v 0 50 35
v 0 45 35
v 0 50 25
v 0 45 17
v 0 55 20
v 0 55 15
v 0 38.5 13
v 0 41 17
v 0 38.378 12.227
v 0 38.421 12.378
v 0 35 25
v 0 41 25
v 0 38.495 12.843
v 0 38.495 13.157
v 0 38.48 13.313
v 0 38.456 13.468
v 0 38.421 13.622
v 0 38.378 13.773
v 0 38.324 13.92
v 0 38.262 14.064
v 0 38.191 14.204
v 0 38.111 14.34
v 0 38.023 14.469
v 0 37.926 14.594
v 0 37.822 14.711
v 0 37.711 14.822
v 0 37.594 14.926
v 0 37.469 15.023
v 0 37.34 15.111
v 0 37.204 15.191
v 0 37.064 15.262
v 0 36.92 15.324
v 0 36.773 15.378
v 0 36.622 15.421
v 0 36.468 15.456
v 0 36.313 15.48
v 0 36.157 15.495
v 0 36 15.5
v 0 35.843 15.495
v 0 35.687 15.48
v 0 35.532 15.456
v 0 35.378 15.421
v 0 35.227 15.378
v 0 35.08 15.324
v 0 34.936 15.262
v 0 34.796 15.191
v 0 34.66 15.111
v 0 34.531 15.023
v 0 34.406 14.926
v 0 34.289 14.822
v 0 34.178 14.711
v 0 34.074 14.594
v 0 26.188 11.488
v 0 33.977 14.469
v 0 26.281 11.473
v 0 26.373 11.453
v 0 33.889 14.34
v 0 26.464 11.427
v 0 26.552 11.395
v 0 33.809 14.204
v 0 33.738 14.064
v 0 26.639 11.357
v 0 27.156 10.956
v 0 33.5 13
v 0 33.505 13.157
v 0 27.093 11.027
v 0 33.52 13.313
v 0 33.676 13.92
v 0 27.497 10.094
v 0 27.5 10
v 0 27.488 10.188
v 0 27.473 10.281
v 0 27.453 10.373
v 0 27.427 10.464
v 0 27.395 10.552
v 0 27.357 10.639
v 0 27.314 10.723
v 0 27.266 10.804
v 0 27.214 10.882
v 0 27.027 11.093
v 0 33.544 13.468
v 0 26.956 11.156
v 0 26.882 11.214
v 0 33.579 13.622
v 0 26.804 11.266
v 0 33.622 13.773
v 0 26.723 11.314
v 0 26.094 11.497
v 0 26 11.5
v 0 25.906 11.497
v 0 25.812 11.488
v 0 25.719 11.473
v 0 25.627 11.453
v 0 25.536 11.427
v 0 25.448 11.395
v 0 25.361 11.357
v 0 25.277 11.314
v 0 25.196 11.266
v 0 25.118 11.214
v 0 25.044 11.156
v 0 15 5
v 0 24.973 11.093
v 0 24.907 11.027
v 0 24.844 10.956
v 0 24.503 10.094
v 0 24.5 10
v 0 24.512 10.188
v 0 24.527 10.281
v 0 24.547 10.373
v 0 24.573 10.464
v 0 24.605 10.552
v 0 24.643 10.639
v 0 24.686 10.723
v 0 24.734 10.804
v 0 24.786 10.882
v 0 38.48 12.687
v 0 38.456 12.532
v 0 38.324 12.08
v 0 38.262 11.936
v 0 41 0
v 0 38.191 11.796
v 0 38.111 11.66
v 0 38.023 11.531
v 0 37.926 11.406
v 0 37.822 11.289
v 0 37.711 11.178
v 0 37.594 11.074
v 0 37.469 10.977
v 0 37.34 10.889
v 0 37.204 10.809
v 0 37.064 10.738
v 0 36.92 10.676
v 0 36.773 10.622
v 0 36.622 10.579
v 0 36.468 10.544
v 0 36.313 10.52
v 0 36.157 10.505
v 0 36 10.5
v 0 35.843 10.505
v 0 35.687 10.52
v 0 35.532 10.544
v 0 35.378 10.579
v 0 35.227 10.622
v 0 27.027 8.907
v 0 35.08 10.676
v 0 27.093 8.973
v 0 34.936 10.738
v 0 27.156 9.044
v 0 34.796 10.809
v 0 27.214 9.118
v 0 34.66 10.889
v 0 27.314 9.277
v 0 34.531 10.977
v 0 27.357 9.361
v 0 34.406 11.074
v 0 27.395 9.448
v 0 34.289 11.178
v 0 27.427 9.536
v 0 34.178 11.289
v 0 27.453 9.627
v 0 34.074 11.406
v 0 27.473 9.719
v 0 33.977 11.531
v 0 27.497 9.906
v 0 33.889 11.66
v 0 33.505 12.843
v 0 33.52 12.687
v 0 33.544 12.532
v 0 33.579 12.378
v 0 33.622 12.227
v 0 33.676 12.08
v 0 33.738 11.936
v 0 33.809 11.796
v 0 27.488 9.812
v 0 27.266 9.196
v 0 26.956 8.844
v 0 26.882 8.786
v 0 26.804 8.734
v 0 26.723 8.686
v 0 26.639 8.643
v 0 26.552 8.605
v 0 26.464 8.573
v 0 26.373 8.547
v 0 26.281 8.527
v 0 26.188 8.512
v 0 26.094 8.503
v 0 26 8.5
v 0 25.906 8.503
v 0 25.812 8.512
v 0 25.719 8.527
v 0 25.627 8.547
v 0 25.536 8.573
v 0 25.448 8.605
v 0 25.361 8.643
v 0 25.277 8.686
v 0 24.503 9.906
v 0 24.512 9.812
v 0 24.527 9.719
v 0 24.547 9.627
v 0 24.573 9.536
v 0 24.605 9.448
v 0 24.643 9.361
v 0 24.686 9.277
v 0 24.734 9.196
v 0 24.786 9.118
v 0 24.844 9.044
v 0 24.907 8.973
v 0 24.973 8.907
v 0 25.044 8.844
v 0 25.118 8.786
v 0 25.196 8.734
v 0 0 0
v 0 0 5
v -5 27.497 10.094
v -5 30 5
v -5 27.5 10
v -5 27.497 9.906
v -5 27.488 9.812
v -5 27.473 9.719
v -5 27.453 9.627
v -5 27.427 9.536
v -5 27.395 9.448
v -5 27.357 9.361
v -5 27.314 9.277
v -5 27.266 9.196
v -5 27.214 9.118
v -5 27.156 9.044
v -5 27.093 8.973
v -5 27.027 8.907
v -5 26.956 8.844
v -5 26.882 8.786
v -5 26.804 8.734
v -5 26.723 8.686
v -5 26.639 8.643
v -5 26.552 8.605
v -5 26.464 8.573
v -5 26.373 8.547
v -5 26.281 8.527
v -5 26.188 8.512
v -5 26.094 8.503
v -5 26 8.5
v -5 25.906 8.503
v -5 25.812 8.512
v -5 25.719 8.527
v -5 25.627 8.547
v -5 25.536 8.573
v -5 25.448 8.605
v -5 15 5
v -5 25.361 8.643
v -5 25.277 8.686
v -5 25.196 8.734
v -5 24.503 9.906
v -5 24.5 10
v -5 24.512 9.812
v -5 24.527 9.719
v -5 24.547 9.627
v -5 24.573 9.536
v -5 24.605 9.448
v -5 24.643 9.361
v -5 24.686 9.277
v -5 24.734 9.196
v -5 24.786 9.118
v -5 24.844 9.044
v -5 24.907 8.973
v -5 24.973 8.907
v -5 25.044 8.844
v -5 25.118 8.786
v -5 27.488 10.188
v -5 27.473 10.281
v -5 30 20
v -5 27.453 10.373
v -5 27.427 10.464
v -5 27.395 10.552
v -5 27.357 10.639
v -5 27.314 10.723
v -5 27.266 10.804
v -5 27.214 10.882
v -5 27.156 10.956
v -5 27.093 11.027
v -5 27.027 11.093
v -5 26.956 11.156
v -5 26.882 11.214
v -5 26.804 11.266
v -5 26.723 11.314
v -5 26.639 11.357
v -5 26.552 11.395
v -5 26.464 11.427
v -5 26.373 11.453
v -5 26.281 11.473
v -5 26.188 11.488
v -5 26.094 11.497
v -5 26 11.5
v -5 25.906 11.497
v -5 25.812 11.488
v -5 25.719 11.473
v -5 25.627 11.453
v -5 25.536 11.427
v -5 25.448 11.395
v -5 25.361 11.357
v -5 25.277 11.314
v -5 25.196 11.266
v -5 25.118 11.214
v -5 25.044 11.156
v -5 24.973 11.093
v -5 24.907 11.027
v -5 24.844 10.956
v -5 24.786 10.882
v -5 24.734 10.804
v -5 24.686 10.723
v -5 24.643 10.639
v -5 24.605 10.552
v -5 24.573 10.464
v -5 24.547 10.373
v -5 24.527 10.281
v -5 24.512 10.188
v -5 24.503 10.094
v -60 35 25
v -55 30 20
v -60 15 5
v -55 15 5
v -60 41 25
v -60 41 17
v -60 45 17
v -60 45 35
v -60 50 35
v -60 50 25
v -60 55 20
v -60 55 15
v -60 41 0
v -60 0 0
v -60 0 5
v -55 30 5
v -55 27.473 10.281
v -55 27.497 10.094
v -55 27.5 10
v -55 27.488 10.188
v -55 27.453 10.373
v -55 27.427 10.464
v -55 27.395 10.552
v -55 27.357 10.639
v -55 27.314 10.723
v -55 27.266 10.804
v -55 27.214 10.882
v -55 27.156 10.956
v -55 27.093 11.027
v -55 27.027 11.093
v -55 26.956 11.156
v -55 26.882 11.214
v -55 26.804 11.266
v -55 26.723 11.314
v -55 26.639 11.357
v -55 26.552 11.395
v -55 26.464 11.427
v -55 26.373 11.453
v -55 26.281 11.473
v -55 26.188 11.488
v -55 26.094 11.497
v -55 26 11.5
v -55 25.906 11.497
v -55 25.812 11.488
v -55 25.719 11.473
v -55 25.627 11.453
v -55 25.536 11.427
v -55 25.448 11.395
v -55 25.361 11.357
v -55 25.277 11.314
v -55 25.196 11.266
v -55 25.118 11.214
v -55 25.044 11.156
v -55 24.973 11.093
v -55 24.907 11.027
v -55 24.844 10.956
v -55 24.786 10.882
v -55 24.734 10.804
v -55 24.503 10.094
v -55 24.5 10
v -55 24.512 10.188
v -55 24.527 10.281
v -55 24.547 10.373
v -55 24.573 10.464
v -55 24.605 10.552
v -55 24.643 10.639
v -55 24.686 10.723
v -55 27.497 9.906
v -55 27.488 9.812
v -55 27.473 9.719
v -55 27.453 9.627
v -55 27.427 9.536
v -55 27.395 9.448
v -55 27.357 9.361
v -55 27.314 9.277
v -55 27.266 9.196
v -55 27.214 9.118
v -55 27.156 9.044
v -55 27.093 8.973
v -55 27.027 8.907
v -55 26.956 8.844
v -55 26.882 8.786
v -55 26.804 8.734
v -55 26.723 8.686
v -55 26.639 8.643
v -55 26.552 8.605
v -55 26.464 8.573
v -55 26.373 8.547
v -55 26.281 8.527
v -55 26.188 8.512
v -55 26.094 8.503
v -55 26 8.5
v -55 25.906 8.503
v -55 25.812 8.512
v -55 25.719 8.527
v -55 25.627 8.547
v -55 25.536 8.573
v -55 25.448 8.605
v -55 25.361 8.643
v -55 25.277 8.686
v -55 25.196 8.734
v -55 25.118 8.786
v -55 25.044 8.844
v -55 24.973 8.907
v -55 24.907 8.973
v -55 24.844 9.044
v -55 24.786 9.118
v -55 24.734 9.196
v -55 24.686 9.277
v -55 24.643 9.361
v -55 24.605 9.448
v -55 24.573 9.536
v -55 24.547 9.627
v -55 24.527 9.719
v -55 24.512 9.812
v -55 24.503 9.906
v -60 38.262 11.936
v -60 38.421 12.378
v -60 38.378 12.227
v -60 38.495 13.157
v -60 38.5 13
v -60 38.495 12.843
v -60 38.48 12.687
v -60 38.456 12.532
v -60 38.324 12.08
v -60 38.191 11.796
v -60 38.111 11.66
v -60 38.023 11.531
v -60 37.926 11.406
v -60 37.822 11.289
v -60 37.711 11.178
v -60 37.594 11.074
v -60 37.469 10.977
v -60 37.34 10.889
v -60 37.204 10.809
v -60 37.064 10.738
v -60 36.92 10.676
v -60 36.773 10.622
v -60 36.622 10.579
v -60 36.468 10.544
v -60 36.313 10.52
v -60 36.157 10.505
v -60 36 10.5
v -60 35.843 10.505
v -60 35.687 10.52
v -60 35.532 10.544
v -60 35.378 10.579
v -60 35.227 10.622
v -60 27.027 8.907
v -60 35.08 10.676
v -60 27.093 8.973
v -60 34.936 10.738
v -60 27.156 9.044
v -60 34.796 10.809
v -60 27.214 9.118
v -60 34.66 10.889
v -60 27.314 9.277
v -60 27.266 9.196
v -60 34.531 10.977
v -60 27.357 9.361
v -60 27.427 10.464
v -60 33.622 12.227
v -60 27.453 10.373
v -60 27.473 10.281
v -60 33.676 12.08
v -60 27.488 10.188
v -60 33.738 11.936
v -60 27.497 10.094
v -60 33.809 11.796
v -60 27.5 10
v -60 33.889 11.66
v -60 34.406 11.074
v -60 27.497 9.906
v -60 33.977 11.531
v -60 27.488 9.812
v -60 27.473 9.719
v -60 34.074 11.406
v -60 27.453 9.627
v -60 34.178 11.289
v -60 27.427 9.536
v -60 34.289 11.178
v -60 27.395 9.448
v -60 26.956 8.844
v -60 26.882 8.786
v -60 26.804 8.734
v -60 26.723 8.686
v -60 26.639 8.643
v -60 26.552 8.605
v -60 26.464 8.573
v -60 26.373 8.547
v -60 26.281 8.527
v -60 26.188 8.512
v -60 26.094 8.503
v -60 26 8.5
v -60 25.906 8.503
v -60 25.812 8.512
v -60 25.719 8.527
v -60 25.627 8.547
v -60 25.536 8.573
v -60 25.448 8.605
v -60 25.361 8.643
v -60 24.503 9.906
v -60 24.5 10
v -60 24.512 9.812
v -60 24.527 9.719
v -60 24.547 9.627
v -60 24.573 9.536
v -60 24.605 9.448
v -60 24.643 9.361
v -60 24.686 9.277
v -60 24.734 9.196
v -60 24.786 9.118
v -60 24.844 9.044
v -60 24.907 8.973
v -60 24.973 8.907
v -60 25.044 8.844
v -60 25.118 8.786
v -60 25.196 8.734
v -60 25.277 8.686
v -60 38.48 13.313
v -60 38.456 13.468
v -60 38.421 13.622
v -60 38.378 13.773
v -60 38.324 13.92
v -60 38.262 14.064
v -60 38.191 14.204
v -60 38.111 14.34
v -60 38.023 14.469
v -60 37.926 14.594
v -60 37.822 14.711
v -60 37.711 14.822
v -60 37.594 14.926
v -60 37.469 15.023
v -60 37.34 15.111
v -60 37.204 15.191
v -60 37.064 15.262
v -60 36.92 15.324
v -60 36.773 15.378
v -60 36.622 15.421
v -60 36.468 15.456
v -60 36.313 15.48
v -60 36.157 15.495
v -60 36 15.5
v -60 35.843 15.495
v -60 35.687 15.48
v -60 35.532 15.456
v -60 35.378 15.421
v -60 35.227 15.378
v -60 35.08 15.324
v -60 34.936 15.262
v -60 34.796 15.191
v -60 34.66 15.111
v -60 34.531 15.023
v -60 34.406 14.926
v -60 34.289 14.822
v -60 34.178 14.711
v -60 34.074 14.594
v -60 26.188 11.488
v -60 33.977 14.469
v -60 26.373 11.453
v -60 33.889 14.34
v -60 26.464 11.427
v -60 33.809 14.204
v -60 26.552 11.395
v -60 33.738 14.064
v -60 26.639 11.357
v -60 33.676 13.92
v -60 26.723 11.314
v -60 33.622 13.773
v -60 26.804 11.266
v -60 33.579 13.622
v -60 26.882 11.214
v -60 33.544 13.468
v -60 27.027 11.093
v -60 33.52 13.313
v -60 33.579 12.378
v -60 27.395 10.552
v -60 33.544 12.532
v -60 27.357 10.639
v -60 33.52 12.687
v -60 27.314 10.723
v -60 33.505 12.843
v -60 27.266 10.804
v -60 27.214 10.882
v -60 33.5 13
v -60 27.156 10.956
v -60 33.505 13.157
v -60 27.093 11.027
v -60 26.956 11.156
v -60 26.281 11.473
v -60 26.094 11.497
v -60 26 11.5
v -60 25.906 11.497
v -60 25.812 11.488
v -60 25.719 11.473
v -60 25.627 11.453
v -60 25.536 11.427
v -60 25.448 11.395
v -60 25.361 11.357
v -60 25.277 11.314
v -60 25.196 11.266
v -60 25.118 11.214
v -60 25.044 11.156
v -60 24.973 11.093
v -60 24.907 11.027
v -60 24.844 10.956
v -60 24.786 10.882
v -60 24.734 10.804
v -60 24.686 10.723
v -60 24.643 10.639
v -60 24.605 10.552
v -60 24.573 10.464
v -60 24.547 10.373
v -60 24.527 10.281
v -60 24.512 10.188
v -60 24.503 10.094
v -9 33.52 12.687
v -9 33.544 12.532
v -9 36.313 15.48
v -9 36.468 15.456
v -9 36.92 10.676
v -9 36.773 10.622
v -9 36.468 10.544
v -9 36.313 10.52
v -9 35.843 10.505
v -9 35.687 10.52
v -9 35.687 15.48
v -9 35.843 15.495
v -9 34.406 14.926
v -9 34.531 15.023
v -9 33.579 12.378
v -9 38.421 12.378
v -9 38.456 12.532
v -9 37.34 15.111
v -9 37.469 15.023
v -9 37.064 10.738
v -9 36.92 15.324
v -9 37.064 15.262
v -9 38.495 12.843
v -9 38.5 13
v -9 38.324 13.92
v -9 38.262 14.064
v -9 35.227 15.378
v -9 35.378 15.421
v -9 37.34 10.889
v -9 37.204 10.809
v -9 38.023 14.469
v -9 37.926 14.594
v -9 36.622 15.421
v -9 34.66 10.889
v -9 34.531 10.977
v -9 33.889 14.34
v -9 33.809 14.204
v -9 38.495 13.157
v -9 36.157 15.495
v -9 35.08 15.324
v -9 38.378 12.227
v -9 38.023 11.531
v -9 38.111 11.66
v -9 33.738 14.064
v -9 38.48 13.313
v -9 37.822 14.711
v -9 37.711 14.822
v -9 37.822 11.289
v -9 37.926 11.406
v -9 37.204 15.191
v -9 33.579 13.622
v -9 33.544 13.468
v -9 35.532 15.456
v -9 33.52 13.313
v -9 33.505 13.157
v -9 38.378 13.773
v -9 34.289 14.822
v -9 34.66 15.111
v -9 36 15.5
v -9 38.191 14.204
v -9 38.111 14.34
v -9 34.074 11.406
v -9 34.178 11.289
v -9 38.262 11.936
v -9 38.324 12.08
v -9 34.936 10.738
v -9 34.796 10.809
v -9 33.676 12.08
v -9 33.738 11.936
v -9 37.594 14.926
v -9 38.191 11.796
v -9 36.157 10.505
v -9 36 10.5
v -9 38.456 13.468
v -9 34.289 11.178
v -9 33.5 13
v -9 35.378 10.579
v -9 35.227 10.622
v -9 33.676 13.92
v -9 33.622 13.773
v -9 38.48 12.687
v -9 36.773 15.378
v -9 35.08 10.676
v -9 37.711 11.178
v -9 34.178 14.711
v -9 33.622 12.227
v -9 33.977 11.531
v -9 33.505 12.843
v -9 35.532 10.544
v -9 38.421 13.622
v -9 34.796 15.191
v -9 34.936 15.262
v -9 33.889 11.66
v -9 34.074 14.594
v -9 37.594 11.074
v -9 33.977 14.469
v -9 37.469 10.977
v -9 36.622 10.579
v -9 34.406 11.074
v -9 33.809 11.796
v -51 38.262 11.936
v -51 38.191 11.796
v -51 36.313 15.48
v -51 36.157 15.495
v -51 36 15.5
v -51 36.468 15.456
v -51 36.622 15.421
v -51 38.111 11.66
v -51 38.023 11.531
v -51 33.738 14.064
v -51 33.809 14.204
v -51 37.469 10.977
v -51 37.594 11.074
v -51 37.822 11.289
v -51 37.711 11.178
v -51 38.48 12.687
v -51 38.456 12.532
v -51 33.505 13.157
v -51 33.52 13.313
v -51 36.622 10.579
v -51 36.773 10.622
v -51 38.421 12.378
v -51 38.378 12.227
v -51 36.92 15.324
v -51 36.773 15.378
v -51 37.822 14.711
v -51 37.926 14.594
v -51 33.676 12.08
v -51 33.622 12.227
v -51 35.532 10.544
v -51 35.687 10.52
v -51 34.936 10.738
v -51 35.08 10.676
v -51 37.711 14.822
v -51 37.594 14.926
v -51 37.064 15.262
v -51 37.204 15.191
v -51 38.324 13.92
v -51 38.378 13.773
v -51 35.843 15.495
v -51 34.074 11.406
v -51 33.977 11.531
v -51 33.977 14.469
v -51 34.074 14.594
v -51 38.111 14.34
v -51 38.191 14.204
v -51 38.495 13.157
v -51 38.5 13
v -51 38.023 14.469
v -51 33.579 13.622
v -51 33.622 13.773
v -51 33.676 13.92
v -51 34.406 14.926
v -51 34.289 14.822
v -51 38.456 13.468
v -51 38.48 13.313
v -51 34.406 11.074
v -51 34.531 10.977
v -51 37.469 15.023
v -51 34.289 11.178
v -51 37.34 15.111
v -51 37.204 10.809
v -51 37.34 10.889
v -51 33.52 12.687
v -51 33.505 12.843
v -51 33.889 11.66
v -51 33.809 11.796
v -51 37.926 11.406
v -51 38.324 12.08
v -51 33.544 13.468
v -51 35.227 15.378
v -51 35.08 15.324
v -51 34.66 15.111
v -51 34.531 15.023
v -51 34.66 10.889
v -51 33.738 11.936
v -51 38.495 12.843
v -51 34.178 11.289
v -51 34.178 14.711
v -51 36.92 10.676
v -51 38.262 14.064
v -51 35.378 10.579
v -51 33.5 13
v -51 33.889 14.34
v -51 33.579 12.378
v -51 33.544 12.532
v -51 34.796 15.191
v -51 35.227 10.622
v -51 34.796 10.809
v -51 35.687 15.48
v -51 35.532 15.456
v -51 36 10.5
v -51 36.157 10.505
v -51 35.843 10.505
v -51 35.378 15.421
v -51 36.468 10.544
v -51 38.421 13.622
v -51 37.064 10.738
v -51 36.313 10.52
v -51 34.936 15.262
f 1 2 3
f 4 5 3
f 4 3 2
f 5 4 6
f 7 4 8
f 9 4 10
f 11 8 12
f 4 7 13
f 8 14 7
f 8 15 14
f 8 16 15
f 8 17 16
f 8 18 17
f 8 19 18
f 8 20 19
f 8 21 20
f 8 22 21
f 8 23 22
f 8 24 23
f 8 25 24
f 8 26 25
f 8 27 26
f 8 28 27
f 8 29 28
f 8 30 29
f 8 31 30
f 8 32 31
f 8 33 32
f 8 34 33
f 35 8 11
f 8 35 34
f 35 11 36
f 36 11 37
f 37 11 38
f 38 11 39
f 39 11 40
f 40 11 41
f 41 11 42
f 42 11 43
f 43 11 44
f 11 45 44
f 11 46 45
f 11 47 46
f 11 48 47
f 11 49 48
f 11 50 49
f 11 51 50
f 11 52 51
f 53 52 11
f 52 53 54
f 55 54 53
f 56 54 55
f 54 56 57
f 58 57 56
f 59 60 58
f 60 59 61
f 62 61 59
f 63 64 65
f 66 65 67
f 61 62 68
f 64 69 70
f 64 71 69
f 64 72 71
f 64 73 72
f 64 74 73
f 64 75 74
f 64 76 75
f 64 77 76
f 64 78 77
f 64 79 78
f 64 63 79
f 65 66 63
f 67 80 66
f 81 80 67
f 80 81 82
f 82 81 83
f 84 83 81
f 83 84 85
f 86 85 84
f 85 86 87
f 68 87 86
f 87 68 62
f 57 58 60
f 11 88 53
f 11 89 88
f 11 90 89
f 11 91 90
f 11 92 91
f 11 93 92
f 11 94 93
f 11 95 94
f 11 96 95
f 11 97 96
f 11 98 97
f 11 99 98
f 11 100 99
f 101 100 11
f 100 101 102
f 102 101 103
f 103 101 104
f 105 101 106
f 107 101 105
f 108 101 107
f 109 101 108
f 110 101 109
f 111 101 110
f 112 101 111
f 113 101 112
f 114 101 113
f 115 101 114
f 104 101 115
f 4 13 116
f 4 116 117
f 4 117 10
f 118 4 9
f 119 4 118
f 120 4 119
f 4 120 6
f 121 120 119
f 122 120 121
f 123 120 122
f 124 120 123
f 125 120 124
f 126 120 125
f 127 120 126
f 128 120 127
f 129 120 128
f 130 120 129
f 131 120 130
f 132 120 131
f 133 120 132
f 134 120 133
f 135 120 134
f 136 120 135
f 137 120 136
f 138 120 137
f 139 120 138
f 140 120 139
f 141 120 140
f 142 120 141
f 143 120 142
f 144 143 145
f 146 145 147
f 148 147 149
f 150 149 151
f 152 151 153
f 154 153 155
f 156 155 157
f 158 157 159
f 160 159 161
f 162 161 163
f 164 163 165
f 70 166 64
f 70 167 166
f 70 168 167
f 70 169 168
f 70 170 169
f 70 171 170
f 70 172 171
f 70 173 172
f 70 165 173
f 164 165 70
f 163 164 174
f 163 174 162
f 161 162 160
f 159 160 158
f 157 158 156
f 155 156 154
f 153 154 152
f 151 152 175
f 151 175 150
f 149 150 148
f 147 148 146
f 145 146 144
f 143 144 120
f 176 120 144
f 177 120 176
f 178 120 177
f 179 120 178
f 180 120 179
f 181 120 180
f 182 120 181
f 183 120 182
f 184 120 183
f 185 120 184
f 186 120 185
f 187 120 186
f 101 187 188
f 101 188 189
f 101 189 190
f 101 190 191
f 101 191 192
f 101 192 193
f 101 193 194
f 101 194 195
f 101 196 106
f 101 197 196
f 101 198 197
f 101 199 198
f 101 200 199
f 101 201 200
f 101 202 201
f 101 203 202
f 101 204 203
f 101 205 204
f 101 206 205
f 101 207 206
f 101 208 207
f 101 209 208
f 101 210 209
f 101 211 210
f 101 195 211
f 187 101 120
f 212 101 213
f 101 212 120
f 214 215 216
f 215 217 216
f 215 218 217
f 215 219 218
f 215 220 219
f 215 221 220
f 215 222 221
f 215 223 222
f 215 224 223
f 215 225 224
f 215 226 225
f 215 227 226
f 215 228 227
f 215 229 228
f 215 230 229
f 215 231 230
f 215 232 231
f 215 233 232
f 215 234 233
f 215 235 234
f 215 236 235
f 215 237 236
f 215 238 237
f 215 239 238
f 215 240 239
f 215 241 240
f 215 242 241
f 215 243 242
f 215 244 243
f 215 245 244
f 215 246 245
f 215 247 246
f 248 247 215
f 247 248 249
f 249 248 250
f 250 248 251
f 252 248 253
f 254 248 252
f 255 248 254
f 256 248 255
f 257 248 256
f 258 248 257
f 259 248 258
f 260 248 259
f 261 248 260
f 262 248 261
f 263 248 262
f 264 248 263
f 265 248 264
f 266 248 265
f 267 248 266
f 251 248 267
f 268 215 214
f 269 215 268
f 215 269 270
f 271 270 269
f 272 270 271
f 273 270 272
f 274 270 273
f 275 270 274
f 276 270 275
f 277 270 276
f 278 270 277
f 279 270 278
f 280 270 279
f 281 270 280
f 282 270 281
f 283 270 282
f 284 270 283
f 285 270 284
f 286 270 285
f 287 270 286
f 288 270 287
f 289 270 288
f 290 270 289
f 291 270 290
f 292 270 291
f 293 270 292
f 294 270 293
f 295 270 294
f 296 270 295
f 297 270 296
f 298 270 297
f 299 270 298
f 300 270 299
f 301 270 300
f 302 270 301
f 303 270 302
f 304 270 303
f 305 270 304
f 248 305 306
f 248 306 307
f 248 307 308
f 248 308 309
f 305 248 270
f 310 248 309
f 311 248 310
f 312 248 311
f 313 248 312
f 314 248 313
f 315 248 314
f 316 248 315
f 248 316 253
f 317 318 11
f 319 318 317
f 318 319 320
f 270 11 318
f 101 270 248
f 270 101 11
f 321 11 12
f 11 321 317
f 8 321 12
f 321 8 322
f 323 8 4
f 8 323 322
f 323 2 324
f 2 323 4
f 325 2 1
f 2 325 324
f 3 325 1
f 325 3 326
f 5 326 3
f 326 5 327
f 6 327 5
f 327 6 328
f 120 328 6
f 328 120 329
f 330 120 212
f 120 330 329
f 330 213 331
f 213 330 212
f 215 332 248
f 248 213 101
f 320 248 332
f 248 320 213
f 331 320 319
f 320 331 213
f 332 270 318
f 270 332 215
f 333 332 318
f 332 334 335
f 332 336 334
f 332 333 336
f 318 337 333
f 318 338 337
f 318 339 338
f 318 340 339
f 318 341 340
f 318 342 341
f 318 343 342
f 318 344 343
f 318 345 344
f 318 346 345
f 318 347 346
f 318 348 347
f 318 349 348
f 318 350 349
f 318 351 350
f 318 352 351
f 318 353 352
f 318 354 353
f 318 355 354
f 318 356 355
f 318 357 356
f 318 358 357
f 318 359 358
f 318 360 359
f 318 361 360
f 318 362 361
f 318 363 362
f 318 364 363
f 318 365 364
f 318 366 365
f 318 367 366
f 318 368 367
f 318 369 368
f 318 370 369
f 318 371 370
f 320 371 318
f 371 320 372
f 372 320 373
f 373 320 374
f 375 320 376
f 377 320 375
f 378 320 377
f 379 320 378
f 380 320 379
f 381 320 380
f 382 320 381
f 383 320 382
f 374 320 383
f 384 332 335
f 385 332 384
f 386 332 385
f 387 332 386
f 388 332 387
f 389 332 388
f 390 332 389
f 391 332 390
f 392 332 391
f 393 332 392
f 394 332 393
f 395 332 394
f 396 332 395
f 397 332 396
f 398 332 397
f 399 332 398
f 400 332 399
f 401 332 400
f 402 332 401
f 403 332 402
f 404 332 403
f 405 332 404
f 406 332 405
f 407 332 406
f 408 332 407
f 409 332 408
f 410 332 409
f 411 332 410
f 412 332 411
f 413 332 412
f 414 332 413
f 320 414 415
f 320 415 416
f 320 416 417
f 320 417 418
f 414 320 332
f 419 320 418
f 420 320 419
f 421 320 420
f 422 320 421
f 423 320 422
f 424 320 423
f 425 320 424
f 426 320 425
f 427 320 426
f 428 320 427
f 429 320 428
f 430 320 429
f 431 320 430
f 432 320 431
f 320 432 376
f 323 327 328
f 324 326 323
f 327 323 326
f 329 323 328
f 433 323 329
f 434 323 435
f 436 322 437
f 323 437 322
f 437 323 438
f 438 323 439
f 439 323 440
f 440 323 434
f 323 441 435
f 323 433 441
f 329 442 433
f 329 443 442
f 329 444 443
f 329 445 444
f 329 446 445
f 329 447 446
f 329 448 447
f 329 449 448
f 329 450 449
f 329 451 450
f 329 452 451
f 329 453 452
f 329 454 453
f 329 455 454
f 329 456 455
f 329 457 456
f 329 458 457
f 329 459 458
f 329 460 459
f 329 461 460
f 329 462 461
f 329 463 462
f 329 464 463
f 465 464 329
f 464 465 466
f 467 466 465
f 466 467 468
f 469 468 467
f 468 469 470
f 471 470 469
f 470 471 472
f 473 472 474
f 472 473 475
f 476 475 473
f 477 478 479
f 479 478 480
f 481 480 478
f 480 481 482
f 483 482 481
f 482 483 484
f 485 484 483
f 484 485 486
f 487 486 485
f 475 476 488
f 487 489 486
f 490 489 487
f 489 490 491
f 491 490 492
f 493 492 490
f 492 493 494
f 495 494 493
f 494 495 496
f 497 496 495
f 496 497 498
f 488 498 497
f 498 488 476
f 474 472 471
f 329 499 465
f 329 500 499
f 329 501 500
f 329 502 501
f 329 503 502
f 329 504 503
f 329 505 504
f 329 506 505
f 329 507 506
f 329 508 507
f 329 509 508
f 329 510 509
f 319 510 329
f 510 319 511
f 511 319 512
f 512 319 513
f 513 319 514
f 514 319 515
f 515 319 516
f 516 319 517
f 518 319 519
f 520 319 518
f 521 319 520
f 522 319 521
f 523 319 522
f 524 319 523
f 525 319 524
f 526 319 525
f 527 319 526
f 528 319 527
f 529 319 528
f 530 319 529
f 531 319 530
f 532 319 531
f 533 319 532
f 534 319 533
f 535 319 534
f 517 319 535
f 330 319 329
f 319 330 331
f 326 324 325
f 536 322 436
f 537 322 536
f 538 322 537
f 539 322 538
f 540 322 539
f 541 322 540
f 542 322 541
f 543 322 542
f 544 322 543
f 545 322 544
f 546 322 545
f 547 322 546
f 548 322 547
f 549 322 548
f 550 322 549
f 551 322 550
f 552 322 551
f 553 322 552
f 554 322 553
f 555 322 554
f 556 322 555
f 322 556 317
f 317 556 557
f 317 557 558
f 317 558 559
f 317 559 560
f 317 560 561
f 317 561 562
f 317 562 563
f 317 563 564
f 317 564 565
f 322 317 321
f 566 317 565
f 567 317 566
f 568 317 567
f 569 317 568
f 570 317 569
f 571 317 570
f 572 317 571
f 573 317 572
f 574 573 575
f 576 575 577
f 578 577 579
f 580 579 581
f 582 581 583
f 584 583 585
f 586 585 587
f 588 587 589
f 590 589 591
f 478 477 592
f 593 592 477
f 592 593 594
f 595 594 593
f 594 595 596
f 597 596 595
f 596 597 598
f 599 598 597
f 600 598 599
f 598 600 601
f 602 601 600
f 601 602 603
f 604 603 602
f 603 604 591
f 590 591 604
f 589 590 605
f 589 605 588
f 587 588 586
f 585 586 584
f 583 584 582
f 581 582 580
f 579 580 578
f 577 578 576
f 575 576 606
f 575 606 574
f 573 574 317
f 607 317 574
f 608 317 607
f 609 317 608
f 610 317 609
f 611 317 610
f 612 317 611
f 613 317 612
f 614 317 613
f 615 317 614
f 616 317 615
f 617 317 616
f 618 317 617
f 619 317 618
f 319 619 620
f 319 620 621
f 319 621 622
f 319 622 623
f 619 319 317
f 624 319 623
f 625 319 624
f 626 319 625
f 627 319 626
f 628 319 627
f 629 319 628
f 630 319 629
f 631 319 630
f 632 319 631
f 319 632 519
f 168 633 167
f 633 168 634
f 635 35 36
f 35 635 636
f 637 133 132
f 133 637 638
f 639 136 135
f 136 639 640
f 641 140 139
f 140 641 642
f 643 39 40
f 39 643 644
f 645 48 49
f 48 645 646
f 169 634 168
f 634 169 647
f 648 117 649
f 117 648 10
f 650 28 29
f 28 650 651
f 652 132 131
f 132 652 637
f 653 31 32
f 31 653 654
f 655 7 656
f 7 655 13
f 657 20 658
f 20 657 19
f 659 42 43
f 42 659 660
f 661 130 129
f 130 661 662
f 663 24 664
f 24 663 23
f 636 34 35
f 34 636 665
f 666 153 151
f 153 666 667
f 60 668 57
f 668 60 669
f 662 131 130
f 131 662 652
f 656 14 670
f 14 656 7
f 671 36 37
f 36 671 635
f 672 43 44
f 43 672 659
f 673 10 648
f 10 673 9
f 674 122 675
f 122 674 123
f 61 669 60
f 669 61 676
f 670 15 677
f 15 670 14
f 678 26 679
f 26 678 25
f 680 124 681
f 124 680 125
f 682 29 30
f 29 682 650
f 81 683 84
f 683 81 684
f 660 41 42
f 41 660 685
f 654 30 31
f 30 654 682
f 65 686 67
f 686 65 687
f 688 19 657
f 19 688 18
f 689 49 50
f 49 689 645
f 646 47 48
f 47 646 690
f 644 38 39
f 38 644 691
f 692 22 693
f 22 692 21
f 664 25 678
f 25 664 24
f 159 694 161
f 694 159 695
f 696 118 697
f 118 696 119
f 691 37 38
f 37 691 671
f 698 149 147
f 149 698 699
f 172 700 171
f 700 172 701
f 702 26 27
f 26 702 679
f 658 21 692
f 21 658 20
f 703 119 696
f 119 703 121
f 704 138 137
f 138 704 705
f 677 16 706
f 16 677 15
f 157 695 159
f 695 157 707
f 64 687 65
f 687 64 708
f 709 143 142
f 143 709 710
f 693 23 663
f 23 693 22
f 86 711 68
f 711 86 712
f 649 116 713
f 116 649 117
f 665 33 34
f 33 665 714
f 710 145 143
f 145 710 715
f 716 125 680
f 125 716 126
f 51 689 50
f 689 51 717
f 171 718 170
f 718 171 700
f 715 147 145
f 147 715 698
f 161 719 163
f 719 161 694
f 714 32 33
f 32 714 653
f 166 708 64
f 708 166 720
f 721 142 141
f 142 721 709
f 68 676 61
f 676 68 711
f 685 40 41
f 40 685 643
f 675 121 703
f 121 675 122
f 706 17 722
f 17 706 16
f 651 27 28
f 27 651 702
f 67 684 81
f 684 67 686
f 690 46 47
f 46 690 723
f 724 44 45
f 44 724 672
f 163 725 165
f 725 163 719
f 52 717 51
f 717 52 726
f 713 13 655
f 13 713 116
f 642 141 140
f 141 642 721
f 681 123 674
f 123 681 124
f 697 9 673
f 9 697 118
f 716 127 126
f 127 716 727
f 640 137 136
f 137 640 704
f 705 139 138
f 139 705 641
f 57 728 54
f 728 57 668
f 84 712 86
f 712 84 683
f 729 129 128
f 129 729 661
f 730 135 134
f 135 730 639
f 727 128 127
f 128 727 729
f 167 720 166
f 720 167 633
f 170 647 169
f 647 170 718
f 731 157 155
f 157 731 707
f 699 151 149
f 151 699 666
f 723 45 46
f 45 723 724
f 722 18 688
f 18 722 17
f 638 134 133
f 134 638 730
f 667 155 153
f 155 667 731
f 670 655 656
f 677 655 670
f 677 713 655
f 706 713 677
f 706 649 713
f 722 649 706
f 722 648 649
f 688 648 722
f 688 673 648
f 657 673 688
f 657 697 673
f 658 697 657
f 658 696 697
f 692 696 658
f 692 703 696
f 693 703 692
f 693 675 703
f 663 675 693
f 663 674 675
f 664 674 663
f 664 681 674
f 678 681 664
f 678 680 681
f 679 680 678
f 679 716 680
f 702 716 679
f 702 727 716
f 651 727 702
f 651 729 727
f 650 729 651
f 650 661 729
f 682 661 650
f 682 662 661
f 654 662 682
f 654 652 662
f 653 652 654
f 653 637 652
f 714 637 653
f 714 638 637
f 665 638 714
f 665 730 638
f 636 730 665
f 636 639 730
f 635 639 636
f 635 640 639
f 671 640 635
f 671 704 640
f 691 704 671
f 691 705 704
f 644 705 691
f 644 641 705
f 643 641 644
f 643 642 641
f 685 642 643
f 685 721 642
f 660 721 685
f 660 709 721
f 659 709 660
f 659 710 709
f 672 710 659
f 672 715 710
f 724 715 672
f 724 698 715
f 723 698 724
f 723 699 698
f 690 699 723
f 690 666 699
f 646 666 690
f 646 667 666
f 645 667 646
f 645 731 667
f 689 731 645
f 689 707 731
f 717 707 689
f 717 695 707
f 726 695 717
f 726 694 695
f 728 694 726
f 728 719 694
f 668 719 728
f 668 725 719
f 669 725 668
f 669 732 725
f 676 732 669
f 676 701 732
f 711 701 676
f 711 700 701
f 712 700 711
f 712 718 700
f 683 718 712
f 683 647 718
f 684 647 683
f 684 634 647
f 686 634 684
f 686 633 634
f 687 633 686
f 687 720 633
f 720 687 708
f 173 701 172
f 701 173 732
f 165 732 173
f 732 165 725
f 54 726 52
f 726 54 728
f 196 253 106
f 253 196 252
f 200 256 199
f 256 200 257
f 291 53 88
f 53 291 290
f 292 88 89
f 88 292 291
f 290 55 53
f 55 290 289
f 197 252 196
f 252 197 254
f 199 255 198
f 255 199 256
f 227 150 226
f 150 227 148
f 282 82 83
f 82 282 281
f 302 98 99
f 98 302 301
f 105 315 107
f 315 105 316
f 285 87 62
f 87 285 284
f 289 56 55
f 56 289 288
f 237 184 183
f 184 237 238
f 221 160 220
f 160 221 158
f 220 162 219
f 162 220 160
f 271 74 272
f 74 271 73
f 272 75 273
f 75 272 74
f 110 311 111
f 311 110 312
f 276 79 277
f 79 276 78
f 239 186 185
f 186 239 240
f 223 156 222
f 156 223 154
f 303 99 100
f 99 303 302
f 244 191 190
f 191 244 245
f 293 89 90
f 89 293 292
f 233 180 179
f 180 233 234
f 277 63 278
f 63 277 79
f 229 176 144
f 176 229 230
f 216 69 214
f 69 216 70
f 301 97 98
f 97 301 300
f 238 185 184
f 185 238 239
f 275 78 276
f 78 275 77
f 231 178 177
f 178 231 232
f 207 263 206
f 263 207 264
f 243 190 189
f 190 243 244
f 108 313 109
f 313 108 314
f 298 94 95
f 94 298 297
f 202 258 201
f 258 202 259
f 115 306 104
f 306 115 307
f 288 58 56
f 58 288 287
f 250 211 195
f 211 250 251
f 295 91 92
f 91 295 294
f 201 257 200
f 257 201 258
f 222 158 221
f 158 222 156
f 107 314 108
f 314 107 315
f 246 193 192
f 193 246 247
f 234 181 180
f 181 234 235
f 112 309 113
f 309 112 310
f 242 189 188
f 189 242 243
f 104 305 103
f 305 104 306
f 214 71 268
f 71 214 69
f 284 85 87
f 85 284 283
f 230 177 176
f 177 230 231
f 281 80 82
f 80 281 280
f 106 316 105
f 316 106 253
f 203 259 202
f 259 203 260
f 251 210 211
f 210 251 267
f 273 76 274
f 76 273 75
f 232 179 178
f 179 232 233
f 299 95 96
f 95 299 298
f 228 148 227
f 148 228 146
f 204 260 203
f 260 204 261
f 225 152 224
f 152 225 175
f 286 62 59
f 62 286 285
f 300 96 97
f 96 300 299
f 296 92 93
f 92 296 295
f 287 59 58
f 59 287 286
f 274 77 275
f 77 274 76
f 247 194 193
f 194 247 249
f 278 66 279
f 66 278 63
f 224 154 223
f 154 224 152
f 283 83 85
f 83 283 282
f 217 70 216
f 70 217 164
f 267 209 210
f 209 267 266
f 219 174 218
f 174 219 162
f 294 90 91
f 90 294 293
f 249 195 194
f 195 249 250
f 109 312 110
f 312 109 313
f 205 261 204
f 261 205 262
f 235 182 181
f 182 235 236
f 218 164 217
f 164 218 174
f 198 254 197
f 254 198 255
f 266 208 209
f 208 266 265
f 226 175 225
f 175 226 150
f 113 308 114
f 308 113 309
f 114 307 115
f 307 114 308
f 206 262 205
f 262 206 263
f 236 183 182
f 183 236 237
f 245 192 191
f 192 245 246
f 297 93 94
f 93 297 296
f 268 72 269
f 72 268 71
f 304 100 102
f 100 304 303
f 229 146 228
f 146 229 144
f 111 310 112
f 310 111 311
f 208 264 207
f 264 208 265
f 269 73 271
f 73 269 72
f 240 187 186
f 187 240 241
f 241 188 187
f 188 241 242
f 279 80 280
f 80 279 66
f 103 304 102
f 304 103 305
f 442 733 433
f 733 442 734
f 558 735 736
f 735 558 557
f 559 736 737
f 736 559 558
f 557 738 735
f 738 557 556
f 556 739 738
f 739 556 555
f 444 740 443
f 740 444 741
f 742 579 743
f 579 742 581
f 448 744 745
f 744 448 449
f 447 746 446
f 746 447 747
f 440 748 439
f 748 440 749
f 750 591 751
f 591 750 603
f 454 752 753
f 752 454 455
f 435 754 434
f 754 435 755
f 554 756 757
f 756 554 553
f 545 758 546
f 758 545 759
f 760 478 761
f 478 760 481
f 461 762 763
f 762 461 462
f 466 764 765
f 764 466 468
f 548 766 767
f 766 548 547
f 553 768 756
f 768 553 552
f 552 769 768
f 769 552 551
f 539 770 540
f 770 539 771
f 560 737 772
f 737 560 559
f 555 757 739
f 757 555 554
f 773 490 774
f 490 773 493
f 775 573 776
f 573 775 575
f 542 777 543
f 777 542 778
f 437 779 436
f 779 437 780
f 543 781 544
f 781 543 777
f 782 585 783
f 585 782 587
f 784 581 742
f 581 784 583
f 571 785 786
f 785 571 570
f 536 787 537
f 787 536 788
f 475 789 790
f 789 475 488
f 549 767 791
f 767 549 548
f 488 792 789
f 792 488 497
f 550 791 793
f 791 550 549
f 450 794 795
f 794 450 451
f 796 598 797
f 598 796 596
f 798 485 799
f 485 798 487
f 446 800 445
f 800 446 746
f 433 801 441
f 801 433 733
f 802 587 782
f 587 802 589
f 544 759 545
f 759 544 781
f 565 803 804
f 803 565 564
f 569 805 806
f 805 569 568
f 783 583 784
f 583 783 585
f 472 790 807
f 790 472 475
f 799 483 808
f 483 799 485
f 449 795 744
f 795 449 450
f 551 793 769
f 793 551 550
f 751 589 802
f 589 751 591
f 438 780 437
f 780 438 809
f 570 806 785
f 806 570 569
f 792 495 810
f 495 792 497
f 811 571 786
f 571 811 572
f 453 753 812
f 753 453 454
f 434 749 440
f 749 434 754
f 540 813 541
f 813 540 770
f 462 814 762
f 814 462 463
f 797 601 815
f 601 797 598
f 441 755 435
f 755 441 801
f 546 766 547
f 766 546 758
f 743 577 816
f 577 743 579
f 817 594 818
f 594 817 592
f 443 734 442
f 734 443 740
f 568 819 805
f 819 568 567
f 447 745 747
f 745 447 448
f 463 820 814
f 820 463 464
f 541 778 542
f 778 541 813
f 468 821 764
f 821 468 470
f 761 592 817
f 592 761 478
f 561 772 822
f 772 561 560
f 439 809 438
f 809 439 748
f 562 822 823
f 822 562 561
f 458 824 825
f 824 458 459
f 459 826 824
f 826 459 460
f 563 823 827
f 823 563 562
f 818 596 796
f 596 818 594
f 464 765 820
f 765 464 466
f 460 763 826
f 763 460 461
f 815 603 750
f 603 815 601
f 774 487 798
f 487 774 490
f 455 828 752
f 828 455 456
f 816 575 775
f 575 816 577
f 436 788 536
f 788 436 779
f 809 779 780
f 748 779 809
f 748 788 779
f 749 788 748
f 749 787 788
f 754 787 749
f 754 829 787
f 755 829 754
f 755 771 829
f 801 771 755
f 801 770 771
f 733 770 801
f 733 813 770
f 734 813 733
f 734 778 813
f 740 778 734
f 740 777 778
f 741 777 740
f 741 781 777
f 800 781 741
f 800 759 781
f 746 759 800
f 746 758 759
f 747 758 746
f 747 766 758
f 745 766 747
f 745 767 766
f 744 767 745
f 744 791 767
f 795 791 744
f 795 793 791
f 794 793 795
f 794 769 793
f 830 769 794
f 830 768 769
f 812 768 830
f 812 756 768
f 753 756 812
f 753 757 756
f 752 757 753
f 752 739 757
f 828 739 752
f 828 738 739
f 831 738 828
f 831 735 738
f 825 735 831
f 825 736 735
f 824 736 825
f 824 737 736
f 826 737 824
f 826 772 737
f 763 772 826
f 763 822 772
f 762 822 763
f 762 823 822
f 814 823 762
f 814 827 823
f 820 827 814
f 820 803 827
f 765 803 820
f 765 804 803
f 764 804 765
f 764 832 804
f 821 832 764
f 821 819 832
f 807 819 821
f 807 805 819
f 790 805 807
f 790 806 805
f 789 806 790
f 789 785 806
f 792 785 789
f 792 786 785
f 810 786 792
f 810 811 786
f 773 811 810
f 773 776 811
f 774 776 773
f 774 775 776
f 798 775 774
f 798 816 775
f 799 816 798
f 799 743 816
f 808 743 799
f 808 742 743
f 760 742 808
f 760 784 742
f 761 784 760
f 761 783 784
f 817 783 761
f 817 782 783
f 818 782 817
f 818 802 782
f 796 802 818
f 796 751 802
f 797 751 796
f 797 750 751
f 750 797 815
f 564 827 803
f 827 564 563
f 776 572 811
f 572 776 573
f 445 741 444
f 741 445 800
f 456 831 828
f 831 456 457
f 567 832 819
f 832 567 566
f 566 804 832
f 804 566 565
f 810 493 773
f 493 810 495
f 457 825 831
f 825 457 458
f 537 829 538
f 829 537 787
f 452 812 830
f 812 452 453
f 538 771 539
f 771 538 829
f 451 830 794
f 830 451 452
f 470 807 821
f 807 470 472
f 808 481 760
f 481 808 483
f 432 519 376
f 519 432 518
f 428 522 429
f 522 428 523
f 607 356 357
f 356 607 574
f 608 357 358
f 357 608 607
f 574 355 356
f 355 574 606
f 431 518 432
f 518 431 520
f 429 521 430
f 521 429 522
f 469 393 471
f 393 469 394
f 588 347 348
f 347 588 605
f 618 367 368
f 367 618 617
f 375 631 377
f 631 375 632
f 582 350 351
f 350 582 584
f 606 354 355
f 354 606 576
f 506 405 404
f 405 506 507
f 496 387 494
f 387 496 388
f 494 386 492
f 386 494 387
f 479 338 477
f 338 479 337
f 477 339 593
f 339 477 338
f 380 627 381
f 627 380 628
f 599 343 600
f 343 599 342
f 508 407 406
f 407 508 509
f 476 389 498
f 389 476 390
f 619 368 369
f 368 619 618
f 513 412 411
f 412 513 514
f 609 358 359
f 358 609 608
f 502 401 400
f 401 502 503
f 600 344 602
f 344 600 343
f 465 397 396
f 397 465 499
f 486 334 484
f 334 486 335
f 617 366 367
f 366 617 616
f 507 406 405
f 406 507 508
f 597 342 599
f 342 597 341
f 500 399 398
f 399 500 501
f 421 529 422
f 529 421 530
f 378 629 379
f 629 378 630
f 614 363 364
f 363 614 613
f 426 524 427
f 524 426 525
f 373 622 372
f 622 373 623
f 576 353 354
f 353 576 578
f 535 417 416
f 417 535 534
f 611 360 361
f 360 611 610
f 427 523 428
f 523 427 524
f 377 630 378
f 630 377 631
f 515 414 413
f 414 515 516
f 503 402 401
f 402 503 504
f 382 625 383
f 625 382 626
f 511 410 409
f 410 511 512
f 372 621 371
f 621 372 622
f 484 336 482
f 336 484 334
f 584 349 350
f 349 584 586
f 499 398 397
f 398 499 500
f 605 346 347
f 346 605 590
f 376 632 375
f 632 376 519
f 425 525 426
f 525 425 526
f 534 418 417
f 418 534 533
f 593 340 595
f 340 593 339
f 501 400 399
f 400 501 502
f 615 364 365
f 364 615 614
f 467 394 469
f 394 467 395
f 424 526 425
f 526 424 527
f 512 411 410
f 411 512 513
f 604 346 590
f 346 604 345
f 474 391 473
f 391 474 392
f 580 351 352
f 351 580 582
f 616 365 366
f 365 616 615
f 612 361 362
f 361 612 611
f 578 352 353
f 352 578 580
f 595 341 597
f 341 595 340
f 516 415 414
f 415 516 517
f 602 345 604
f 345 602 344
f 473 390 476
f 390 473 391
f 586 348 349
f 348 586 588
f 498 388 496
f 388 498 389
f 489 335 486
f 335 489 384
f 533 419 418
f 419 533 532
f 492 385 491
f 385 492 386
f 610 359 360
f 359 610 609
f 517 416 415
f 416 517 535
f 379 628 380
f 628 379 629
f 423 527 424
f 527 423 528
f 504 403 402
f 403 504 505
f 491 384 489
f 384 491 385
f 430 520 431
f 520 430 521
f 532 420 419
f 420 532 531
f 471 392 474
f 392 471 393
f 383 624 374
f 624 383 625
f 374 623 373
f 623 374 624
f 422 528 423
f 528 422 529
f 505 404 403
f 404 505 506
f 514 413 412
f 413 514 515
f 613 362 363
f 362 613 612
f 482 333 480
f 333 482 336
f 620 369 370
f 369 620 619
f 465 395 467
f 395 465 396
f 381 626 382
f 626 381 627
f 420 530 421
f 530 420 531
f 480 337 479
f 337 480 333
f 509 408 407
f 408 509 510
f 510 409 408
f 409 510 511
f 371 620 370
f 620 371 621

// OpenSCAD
module wall(){
    linear_extrude(5) {
        polygon([
            [ 0,  0],
            [ 0, 41],
            [15, 55],
            [20, 55],
            [25, 50],
            [35, 50],
            [35, 45],
            [17, 45],
            [17, 41],
            [25, 41],
            [25, 35],
            [ 5, 15],
            [ 5,  0]
        ]);
    }
}
module body(size) {
    linear_extrude(size)
        polygon([
            [ 0,  0],
            [ 0, 41],
            [15, 55],
            [20, 55],
            [25, 50],
            [35, 50],
            [35, 45],
            [17, 45],
            [17, 41],
            [25, 41],
            [25, 35],
            [20, 30],
            [ 5, 30],
            [ 5,  0]
        ]);
}
module piece() {
    wall();
    translate([0,0,4.5])
        body(51);
    translate([0,0,55])
        wall();
}
$fn=100;
rotate([0,-90,0])
    difference() {
        piece();
        translate([13, 36, -9])
            cylinder(18, d=5);
        translate([10, 26, -2])
            cylinder(12, d=3); 
        translate([13, 36, 51])
            cylinder(18, d=5);
        translate([10, 26, 52])
            cylinder(12, d=3); 
    }
